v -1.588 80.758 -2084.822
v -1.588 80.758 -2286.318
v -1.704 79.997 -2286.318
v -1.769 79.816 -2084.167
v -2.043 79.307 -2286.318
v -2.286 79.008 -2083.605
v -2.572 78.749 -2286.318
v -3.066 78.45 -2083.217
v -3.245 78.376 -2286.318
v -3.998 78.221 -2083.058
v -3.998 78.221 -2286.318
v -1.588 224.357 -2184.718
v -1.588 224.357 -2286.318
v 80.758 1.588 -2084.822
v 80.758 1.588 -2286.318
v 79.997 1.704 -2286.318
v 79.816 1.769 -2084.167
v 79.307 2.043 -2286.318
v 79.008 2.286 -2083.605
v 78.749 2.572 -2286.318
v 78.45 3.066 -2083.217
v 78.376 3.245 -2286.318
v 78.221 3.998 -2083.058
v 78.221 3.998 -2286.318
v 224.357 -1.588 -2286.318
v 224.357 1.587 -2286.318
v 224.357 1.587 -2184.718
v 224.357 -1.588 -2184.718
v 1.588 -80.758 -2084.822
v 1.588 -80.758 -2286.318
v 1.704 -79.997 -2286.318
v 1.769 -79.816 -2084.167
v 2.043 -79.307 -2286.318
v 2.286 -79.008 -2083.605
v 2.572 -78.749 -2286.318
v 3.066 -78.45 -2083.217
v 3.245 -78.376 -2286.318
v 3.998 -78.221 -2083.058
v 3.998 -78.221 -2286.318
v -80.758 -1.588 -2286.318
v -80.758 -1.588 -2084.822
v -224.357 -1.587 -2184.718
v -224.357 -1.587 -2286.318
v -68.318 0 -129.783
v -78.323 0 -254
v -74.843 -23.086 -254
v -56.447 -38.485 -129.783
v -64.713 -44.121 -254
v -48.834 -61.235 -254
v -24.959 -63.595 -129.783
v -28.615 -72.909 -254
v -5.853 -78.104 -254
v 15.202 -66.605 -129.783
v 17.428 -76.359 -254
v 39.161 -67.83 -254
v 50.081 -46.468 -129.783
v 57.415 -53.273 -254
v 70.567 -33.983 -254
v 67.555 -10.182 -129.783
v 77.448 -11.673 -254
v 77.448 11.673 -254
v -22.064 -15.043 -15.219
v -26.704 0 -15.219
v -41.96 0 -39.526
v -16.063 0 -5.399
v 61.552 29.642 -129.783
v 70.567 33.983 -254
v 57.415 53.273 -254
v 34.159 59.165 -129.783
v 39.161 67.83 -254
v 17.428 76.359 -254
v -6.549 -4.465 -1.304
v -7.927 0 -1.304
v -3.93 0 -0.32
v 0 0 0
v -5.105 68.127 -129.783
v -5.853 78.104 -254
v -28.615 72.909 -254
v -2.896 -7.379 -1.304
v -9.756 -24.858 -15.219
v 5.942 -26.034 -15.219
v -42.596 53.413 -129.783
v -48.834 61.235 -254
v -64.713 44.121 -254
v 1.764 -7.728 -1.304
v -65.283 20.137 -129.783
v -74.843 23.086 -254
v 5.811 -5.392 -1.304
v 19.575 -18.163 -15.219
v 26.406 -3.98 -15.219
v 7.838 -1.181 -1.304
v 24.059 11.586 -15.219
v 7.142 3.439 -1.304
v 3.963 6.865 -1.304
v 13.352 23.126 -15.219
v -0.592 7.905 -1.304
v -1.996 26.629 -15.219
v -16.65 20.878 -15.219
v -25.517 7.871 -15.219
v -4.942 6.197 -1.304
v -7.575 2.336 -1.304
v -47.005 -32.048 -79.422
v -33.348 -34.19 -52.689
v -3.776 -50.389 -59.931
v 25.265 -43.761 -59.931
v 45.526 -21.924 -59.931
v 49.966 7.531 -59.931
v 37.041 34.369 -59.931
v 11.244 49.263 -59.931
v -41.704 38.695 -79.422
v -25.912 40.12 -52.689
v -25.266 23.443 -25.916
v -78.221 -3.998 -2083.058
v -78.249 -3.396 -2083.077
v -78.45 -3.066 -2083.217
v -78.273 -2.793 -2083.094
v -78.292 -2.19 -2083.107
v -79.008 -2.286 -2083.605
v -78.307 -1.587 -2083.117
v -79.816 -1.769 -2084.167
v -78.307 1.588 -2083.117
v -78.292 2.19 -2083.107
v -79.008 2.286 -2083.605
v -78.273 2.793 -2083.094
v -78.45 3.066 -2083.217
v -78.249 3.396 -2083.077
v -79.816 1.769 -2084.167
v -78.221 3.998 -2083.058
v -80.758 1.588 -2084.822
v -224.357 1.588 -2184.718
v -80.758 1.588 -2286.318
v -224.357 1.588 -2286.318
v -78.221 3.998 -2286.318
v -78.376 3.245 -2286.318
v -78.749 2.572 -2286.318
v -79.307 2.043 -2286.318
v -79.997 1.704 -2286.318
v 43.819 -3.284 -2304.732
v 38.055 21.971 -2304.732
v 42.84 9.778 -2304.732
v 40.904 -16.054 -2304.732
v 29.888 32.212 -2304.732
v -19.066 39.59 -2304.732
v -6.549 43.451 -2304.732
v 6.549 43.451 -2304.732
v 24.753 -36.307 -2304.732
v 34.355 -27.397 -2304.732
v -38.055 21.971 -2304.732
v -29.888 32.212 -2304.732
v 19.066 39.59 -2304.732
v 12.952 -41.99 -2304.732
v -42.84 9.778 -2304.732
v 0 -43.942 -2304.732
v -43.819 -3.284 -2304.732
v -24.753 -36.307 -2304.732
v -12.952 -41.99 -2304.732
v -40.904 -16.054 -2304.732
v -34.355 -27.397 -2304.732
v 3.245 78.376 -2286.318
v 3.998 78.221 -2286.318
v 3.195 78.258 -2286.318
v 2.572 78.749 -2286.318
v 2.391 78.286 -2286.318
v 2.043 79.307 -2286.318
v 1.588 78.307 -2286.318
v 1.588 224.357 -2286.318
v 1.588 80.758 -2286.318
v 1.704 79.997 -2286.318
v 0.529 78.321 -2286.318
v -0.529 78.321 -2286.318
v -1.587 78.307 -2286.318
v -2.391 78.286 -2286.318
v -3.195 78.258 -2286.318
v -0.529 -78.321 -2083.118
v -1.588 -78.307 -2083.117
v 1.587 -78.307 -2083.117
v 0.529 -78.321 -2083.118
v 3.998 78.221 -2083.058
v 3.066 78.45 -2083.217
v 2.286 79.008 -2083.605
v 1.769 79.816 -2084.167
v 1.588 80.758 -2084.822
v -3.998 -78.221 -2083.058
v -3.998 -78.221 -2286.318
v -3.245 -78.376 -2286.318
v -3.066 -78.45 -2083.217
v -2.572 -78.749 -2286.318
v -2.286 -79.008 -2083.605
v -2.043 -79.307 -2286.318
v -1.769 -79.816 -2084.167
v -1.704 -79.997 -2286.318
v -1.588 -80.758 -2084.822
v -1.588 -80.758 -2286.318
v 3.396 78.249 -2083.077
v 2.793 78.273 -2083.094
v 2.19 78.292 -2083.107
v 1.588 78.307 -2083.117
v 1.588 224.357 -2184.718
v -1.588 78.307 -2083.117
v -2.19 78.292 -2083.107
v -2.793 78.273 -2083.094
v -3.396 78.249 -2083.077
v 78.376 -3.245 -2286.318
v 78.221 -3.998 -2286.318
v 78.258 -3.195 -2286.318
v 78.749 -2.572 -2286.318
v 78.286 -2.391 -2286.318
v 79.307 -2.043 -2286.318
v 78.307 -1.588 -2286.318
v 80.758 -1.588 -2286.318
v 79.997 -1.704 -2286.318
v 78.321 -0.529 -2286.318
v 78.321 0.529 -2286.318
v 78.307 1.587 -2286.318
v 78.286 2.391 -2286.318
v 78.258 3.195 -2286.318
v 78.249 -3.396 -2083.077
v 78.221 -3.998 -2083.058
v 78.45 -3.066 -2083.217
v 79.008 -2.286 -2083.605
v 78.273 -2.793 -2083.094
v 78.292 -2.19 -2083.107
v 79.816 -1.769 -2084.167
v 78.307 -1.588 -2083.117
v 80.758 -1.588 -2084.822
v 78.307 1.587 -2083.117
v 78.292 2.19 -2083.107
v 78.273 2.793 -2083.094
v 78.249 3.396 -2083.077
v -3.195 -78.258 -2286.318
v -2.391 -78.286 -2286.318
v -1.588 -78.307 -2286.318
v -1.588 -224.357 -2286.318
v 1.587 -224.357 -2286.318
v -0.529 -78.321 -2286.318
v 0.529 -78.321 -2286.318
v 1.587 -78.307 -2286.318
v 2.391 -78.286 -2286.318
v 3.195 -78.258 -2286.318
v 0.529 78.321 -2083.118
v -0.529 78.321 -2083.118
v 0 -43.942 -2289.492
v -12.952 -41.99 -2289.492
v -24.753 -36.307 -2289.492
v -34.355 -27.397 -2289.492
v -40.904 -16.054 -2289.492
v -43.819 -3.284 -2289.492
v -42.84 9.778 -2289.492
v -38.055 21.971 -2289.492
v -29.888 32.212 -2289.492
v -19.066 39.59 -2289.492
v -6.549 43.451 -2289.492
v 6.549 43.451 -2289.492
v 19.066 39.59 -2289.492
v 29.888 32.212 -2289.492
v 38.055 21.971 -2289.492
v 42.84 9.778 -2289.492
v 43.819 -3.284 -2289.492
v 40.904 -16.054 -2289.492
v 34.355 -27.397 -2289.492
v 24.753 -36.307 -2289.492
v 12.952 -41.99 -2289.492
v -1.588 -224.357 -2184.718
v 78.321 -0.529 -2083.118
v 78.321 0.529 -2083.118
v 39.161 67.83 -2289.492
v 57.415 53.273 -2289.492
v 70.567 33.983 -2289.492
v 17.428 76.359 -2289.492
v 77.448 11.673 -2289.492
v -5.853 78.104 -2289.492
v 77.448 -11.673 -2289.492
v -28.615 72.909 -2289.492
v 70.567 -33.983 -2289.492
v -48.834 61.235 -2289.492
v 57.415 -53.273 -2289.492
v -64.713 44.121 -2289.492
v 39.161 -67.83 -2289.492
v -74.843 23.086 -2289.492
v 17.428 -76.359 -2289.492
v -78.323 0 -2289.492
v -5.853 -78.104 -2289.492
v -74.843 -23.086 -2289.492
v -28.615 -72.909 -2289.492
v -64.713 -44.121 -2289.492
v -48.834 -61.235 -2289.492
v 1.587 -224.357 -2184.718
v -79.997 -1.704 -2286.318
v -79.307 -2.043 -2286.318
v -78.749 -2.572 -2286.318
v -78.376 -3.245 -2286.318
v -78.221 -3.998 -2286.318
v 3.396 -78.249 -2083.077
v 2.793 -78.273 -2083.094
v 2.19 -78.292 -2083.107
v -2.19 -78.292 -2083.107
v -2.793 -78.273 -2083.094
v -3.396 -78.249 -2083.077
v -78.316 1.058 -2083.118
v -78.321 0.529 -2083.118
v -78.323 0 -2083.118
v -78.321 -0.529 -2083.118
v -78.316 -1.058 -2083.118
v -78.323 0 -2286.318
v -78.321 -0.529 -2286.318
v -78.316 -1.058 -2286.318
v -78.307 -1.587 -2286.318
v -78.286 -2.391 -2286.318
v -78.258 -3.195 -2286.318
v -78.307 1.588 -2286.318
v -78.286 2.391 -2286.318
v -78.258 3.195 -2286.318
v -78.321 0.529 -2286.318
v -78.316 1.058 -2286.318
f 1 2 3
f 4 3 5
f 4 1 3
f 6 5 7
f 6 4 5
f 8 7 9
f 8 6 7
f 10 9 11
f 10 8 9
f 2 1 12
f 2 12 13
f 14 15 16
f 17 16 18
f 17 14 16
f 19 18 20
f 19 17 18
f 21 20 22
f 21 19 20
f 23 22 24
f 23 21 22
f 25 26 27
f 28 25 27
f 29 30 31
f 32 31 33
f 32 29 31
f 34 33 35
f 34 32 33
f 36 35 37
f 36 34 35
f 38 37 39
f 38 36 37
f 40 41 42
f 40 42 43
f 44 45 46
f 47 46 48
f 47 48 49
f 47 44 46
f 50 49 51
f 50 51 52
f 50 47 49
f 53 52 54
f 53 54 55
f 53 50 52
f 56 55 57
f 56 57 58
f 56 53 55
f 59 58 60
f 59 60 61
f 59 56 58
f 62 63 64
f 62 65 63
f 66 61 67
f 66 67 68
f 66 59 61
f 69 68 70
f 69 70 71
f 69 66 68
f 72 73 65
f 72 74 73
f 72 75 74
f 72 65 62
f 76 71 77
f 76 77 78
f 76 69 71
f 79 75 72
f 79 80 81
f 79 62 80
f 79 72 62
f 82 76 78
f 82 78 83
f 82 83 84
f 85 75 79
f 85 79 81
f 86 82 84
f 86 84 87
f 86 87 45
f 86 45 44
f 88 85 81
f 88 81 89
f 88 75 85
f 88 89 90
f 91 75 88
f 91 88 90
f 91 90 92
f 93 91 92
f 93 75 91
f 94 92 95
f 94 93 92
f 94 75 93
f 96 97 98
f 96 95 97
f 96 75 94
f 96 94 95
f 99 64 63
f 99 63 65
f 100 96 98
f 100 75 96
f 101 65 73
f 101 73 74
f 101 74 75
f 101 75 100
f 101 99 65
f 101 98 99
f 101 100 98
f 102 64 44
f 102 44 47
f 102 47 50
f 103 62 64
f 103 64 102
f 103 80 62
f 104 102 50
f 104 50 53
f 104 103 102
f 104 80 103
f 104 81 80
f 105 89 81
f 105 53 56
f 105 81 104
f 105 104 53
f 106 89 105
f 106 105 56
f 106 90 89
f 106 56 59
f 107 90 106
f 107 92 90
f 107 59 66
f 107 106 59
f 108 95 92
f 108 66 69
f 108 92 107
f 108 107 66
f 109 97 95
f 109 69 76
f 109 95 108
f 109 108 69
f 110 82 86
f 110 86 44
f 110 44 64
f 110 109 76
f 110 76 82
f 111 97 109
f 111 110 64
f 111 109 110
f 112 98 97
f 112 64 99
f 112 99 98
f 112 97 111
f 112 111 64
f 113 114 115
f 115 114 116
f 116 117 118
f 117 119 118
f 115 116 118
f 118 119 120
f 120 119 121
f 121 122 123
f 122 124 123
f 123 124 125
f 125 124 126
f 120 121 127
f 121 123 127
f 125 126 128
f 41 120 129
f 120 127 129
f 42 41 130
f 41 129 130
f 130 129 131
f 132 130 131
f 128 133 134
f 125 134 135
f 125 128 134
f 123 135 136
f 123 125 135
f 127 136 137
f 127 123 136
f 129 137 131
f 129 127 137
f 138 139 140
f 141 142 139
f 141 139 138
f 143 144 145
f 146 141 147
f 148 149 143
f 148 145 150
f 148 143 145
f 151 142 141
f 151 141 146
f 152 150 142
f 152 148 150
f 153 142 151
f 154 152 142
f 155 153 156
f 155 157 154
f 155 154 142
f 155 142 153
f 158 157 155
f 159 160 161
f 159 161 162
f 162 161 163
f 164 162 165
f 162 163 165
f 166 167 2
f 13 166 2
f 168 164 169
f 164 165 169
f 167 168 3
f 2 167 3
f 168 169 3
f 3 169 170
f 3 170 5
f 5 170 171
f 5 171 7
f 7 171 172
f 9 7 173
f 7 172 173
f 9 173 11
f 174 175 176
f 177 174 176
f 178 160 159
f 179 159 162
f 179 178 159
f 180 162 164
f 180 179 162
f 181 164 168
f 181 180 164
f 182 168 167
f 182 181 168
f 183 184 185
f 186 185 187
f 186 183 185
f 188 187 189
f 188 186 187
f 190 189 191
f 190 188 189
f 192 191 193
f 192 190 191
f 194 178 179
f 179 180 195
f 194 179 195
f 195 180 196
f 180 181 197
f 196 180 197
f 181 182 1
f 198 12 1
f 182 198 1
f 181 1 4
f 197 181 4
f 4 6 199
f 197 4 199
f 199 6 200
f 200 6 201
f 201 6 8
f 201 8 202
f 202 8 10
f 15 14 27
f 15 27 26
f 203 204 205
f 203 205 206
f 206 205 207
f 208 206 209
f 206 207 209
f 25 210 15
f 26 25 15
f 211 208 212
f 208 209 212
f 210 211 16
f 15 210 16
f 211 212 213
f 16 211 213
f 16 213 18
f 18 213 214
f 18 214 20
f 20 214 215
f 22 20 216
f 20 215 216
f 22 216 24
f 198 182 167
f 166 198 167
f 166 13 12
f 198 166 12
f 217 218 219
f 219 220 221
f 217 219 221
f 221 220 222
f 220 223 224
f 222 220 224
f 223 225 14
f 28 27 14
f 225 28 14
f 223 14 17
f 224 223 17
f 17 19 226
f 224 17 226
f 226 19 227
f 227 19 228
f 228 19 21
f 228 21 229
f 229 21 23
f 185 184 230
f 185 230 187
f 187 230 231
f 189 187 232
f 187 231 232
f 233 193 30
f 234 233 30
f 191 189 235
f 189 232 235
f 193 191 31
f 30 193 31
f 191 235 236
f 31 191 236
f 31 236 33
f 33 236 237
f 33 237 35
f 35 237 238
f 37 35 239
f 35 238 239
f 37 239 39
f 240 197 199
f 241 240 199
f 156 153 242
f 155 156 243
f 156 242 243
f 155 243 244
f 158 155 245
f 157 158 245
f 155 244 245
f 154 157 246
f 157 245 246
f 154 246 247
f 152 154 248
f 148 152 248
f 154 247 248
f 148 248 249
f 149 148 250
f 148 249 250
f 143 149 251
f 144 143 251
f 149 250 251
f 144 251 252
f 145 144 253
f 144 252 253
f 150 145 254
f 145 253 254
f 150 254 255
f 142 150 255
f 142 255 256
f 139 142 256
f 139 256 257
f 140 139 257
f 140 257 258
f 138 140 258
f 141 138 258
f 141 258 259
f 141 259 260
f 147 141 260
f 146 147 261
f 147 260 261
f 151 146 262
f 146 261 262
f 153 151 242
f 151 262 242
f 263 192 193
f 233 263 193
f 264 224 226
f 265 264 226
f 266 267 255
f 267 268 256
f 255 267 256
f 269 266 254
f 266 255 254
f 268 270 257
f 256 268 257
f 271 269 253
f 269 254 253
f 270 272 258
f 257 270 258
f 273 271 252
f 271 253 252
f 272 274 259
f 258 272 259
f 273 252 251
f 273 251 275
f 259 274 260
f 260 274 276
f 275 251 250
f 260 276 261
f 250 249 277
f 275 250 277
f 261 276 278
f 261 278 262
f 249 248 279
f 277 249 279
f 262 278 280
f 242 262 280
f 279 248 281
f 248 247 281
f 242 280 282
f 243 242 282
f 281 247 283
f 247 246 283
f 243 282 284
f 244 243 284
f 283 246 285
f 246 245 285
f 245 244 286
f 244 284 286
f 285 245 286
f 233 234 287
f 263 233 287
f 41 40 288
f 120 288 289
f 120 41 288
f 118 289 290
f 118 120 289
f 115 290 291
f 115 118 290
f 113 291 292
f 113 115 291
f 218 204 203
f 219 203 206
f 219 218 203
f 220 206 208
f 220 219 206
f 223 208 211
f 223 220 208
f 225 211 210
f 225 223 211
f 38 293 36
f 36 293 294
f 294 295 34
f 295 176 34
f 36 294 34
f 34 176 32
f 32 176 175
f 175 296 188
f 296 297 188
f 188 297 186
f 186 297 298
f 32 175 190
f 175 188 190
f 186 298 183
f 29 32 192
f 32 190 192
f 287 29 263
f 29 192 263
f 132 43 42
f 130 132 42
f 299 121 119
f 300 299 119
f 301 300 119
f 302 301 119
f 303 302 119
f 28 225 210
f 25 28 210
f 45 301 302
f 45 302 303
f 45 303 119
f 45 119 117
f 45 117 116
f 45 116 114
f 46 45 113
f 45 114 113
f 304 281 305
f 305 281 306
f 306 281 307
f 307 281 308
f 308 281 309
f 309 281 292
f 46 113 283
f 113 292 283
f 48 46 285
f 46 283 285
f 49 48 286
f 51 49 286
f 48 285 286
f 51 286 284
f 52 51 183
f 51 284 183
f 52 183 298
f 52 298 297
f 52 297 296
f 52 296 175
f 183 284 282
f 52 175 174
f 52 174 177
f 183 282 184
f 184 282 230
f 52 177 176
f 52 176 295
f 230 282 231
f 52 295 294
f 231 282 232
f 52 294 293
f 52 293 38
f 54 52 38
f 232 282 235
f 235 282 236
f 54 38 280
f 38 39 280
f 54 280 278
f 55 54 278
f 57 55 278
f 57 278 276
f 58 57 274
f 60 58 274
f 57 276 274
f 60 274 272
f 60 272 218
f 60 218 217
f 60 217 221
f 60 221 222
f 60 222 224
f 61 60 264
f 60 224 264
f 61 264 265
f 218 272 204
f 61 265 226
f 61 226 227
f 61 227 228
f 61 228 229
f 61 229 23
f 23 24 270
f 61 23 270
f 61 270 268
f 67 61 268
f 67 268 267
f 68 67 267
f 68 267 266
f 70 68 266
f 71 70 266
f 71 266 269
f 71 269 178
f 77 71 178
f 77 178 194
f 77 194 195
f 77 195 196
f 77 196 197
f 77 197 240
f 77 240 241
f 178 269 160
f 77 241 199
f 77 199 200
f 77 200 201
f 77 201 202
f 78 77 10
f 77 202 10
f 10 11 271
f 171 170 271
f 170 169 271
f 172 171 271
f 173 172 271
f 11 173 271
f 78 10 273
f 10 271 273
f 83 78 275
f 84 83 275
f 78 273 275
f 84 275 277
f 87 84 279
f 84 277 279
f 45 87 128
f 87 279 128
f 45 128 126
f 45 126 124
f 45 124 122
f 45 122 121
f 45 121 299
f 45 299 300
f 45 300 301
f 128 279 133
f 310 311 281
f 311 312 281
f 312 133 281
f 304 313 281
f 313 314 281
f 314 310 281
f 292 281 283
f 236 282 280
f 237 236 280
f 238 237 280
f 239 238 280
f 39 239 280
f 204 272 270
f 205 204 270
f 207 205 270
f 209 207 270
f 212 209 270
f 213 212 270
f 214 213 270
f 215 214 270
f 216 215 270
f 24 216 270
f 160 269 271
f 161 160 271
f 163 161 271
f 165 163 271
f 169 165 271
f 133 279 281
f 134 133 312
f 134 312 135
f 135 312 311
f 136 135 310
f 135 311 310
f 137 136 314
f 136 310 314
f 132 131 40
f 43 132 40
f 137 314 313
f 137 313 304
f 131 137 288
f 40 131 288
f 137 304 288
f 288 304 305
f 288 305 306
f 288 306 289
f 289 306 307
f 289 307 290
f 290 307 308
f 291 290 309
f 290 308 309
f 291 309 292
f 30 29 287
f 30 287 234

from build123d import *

# Parameters (mm, degrees)
SKETCH3_R                = 43.942
BOSS_EXTRUDE1_DEPTH      = 15.24
BOSS_EXTRUDE2_REACH      = 2331.885
BOSS_EXTRUDE2_END_RADIUS = 78.322932
SKETCH4_W                = 3.175
SKETCH4_H                = 203.2
CUT_EXTRUDE1_REACH       = 2322.063
FILLET1_R                = 2.54
CIRPATTERN1_COUNT        = 4
FILLET1_OF_CIRPATTERN1_R = 2.54


with BuildPart() as part:
    # Sketch2 → Revolve1 (revolve)
    with BuildSketch(Plane(origin=(0, 0, 0), x_dir=(0, 0, -1), z_dir=(1, 0, 0)), mode=Mode.PRIVATE) as revolve1_sk:
        with BuildLine():
            Line((254, 78.322932), (2289.4925, 78.322932))
            Line((2289.4925, 78.322932), (2289.4925, 0))
            Line((2289.4925, 0), (0, 0))
            add(Edge.make_bspline(
                [(254, 78.322932), (0, 78.322932), (0, 0)],
                knots=[4.71238898, 4.71238898, 4.71238898, 6.283185307, 6.283185307, 6.283185307], degree=2, weights=[1, 0.707106781, 1]))
        make_face()
    revolve(revolve1_sk.sketch.rotate(Axis((0, 0, -2289.4925), (0, 0, 1)), 90), axis=Axis((0, 0, -2289.4925), (0, 0, 1)))

    # Sketch3 → Boss-Extrude1 (add)
    with BuildSketch(Plane(origin=(0, 0, -2289.4925), x_dir=(-1, 0, 0), z_dir=(0, 0, -1))):
        with Locations(Location((0, 0, 0), (0, 0, 270))):
            Circle(SKETCH3_R)
    extrude(amount=BOSS_EXTRUDE1_DEPTH)

    # Boss-Extrude2: up to this cylinder (the profile starts outside it)
    boss_extrude2_end = Plane(origin=(0, 0, -2184.7175), z_dir=(0, 0, -1)) * Cylinder(BOSS_EXTRUDE2_END_RADIUS, 4821.415864, mode=Mode.PRIVATE)
    # Sketch4 → Boss-Extrude2 (add, up to the surface)
    with BuildSketch(Plane(origin=(0, 254, 0), x_dir=(1, 0, 0), z_dir=(0, 1, 0)), mode=Mode.PRIVATE) as boss_extrude2_sk1:
        with Locations((0, 2184.7175)):
            Rectangle(SKETCH4_W, SKETCH4_H)
    boss_extrude2_tool1 = extrude(boss_extrude2_sk1.sketch, amount=-BOSS_EXTRUDE2_REACH, mode=Mode.PRIVATE) - boss_extrude2_end
    boss_extrude2 = boss_extrude2_tool1.solids().sort_by_distance((0, 254, -2184.7175))[0]
    add(boss_extrude2)

    # Sketch5 → Cut-Extrude1 (cut, up to next)
    with BuildSketch(Plane.ZY.offset(1.5875), mode=Mode.PRIVATE) as cut_extrude1_sk1:
        Polygon((-2286.3175, 224.356842107), (-2184.7175, 224.356842107), (-2083.1175, 78.306842107), (-2083.1175, 254), (-2286.3175, 254), align=None)
    cut_extrude1_tool1 = extrude(cut_extrude1_sk1.sketch, amount=-CUT_EXTRUDE1_REACH, mode=Mode.PRIVATE) & part.part
    cut_extrude1 = cut_extrude1_tool1.solids().sort_by_distance((-1.5875, 204.128915, -2147.334252))[0]
    add(cut_extrude1, mode=Mode.SUBTRACT)

    # Fillet1
    # the kernel refuses this fillet: 2.54 mm, written as the material it adds along each edge
    with BuildSketch(Plane(origin=(-1.5875, 78.306842107, -2076.990797857), x_dir=(-0.9993639751499004, -0.03566013422001241, 0), z_dir=(0, 0, -1))) as fillet1_piece_1_section:
        with BuildLine():
            CenterArc((2.450992889, 2.539698904), FILLET1_R, 182.043608468, 87.074170625)
            Line((-0.087391608, 2.449122163), (0, 0))
            ThreePointArc((0, 0), (1.205942189, 0.009284527), (2.411884379, 0))
        make_face()
    fillet1_piece_1 = extrude(amount=209.326702143, mode=Mode.PRIVATE)
    fillet1_piece_1 = split(fillet1_piece_1, bisect_by=Plane(origin=(-3.095055571, 78.248638535, -2083.077010558), z_dir=(0, -0.5710644881985995, -0.8209052017854874)), keep=Keep.TOP, mode=Mode.PRIVATE)
    add(fillet1_piece_1)
    with BuildSketch(Plane(origin=(1.5875, 78.306842107, -2076.990797857), x_dir=(0.9993639751499004, -0.035660134220013434, 0), z_dir=(0, 0, -1))) as fillet1_piece_2_section:
        with BuildLine():
            CenterArc((2.450992889, -2.539698904), FILLET1_R, 90.882220907, 87.074170625)
            Line((-0.087391608, -2.449122163), (0, 0))
            ThreePointArc((0, 0), (1.205942189, -0.009284527), (2.411884379, 0))
        make_face()
    fillet1_piece_2 = extrude(amount=209.326702143, mode=Mode.PRIVATE)
    fillet1_piece_2 = split(fillet1_piece_2, bisect_by=Plane(origin=(3.095055571, 78.248638535, -2083.077010558), z_dir=(0, -0.5710644881985995, -0.8209052017854874)), keep=Keep.TOP, mode=Mode.PRIVATE)
    add(fillet1_piece_2)

    # CirPattern1: Boss-Extrude2, Cut-Extrude1 ×4 about axis
    cirpattern1_axis = Axis((0, 0, 0), (0, 0, 1))
    add([boss_extrude2.rotate(cirpattern1_axis, i * 360 / CIRPATTERN1_COUNT) for i in range(1, CIRPATTERN1_COUNT)])
    add([cut_extrude1.rotate(cirpattern1_axis, i * 360 / CIRPATTERN1_COUNT) for i in range(1, CIRPATTERN1_COUNT)], mode=Mode.SUBTRACT)

    # Fillet1 of CirPattern1
    # the kernel refuses this fillet: 2.54 mm, written as the material it adds along each edge
    with BuildSketch(Plane(origin=(-78.306842107, -1.5875, -2076.990797857), x_dir=(0.035660134220018486, -0.9993639751499002, 0), z_dir=(0, 0, -1))) as fillet1_of_cirpattern1_piece_1_section:
        with BuildLine():
            CenterArc((2.450992889, 2.539698904), FILLET1_OF_CIRPATTERN1_R, 182.043608468, 87.074170625)
            Line((-0.087391608, 2.449122163), (0, 0))
            ThreePointArc((0, 0), (1.205942189, 0.009284527), (2.411884379, 0))
        make_face()
    fillet1_of_cirpattern1_piece_1 = extrude(amount=209.326702143, mode=Mode.PRIVATE)
    fillet1_of_cirpattern1_piece_1 = split(fillet1_of_cirpattern1_piece_1, bisect_by=Plane(origin=(-78.248638535, -3.095055571, -2083.077010558), z_dir=(0.5710644881985995, 0, -0.8209052017854874)), keep=Keep.TOP, mode=Mode.PRIVATE)
    add(fillet1_of_cirpattern1_piece_1)
    with BuildSketch(Plane(origin=(-78.306842107, 1.5875, -2076.990797857), x_dir=(0.03566013422001241, 0.9993639751499004, 0), z_dir=(0, 0, -1))) as fillet1_of_cirpattern1_piece_2_section:
        with BuildLine():
            CenterArc((2.450992889, -2.539698904), FILLET1_OF_CIRPATTERN1_R, 90.882220907, 87.074170625)
            Line((-0.087391608, -2.449122163), (0, 0))
            ThreePointArc((0, 0), (1.205942189, -0.009284527), (2.411884379, 0))
        make_face()
    fillet1_of_cirpattern1_piece_2 = extrude(amount=209.326702143, mode=Mode.PRIVATE)
    fillet1_of_cirpattern1_piece_2 = split(fillet1_of_cirpattern1_piece_2, bisect_by=Plane(origin=(-78.248638535, 3.095055571, -2083.077010558), z_dir=(0.5710644881985995, 0, -0.8209052017854874)), keep=Keep.TOP, mode=Mode.PRIVATE)
    add(fillet1_of_cirpattern1_piece_2)
    with BuildSketch(Plane(origin=(1.5875, -78.306842107, -2076.990797857), x_dir=(0.9993639751499002, 0.035660134220018555, 0), z_dir=(0, 0, -1))) as fillet1_of_cirpattern1_piece_3_section:
        with BuildLine():
            CenterArc((2.450992889, 2.539698904), FILLET1_OF_CIRPATTERN1_R, 182.043608468, 87.074170625)
            Line((-0.087391608, 2.449122163), (0, 0))
            ThreePointArc((0, 0), (1.205942189, 0.009284527), (2.411884379, 0))
        make_face()
    fillet1_of_cirpattern1_piece_3 = extrude(amount=209.326702143, mode=Mode.PRIVATE)
    fillet1_of_cirpattern1_piece_3 = split(fillet1_of_cirpattern1_piece_3, bisect_by=Plane(origin=(3.095055571, -78.248638535, -2083.077010558), z_dir=(0, 0.5710644881985995, -0.8209052017854874)), keep=Keep.TOP, mode=Mode.PRIVATE)
    add(fillet1_of_cirpattern1_piece_3)
    with BuildSketch(Plane(origin=(-1.5875, -78.306842107, -2076.990797857), x_dir=(-0.9993639751499004, 0.03566013422001239, 0), z_dir=(0, 0, -1))) as fillet1_of_cirpattern1_piece_4_section:
        with BuildLine():
            CenterArc((2.450992889, -2.539698904), FILLET1_OF_CIRPATTERN1_R, 90.882220907, 87.074170625)
            Line((-0.087391608, -2.449122163), (0, 0))
            ThreePointArc((0, 0), (1.205942189, -0.009284527), (2.411884379, 0))
        make_face()
    fillet1_of_cirpattern1_piece_4 = extrude(amount=209.326702143, mode=Mode.PRIVATE)
    fillet1_of_cirpattern1_piece_4 = split(fillet1_of_cirpattern1_piece_4, bisect_by=Plane(origin=(-3.095055571, -78.248638535, -2083.077010558), z_dir=(0, 0.5710644881985995, -0.8209052017854874)), keep=Keep.TOP, mode=Mode.PRIVATE)
    add(fillet1_of_cirpattern1_piece_4)
    with BuildSketch(Plane(origin=(78.306842107, 1.5875, -2076.990797857), x_dir=(-0.03566013422001241, 0.9993639751499004, 0), z_dir=(0, 0, -1))) as fillet1_of_cirpattern1_piece_5_section:
        with BuildLine():
            CenterArc((2.450992889, 2.539698904), FILLET1_OF_CIRPATTERN1_R, 182.043608468, 87.074170625)
            Line((-0.087391608, 2.449122163), (0, 0))
            ThreePointArc((0, 0), (1.205942189, 0.009284527), (2.411884379, 0))
        make_face()
    fillet1_of_cirpattern1_piece_5 = extrude(amount=209.326702143, mode=Mode.PRIVATE)
    fillet1_of_cirpattern1_piece_5 = split(fillet1_of_cirpattern1_piece_5, bisect_by=Plane(origin=(78.248638535, 3.095055571, -2083.077010558), z_dir=(-0.5710644881985995, 0, -0.8209052017854874)), keep=Keep.TOP, mode=Mode.PRIVATE)
    add(fillet1_of_cirpattern1_piece_5)
    with BuildSketch(Plane(origin=(78.306842107, -1.5875, -2076.990797857), x_dir=(-0.03566013422001239, -0.9993639751499004, 0), z_dir=(0, 0, -1))) as fillet1_of_cirpattern1_piece_6_section:
        with BuildLine():
            CenterArc((2.450992889, -2.539698904), FILLET1_OF_CIRPATTERN1_R, 90.882220907, 87.074170625)
            Line((-0.087391608, -2.449122163), (0, 0))
            ThreePointArc((0, 0), (1.205942189, -0.009284527), (2.411884379, 0))
        make_face()
    fillet1_of_cirpattern1_piece_6 = extrude(amount=209.326702143, mode=Mode.PRIVATE)
    fillet1_of_cirpattern1_piece_6 = split(fillet1_of_cirpattern1_piece_6, bisect_by=Plane(origin=(78.248638535, -3.095055571, -2083.077010558), z_dir=(-0.5710644881985995, 0, -0.8209052017854874)), keep=Keep.TOP, mode=Mode.PRIVATE)
    add(fillet1_of_cirpattern1_piece_6)


solid = part.part
